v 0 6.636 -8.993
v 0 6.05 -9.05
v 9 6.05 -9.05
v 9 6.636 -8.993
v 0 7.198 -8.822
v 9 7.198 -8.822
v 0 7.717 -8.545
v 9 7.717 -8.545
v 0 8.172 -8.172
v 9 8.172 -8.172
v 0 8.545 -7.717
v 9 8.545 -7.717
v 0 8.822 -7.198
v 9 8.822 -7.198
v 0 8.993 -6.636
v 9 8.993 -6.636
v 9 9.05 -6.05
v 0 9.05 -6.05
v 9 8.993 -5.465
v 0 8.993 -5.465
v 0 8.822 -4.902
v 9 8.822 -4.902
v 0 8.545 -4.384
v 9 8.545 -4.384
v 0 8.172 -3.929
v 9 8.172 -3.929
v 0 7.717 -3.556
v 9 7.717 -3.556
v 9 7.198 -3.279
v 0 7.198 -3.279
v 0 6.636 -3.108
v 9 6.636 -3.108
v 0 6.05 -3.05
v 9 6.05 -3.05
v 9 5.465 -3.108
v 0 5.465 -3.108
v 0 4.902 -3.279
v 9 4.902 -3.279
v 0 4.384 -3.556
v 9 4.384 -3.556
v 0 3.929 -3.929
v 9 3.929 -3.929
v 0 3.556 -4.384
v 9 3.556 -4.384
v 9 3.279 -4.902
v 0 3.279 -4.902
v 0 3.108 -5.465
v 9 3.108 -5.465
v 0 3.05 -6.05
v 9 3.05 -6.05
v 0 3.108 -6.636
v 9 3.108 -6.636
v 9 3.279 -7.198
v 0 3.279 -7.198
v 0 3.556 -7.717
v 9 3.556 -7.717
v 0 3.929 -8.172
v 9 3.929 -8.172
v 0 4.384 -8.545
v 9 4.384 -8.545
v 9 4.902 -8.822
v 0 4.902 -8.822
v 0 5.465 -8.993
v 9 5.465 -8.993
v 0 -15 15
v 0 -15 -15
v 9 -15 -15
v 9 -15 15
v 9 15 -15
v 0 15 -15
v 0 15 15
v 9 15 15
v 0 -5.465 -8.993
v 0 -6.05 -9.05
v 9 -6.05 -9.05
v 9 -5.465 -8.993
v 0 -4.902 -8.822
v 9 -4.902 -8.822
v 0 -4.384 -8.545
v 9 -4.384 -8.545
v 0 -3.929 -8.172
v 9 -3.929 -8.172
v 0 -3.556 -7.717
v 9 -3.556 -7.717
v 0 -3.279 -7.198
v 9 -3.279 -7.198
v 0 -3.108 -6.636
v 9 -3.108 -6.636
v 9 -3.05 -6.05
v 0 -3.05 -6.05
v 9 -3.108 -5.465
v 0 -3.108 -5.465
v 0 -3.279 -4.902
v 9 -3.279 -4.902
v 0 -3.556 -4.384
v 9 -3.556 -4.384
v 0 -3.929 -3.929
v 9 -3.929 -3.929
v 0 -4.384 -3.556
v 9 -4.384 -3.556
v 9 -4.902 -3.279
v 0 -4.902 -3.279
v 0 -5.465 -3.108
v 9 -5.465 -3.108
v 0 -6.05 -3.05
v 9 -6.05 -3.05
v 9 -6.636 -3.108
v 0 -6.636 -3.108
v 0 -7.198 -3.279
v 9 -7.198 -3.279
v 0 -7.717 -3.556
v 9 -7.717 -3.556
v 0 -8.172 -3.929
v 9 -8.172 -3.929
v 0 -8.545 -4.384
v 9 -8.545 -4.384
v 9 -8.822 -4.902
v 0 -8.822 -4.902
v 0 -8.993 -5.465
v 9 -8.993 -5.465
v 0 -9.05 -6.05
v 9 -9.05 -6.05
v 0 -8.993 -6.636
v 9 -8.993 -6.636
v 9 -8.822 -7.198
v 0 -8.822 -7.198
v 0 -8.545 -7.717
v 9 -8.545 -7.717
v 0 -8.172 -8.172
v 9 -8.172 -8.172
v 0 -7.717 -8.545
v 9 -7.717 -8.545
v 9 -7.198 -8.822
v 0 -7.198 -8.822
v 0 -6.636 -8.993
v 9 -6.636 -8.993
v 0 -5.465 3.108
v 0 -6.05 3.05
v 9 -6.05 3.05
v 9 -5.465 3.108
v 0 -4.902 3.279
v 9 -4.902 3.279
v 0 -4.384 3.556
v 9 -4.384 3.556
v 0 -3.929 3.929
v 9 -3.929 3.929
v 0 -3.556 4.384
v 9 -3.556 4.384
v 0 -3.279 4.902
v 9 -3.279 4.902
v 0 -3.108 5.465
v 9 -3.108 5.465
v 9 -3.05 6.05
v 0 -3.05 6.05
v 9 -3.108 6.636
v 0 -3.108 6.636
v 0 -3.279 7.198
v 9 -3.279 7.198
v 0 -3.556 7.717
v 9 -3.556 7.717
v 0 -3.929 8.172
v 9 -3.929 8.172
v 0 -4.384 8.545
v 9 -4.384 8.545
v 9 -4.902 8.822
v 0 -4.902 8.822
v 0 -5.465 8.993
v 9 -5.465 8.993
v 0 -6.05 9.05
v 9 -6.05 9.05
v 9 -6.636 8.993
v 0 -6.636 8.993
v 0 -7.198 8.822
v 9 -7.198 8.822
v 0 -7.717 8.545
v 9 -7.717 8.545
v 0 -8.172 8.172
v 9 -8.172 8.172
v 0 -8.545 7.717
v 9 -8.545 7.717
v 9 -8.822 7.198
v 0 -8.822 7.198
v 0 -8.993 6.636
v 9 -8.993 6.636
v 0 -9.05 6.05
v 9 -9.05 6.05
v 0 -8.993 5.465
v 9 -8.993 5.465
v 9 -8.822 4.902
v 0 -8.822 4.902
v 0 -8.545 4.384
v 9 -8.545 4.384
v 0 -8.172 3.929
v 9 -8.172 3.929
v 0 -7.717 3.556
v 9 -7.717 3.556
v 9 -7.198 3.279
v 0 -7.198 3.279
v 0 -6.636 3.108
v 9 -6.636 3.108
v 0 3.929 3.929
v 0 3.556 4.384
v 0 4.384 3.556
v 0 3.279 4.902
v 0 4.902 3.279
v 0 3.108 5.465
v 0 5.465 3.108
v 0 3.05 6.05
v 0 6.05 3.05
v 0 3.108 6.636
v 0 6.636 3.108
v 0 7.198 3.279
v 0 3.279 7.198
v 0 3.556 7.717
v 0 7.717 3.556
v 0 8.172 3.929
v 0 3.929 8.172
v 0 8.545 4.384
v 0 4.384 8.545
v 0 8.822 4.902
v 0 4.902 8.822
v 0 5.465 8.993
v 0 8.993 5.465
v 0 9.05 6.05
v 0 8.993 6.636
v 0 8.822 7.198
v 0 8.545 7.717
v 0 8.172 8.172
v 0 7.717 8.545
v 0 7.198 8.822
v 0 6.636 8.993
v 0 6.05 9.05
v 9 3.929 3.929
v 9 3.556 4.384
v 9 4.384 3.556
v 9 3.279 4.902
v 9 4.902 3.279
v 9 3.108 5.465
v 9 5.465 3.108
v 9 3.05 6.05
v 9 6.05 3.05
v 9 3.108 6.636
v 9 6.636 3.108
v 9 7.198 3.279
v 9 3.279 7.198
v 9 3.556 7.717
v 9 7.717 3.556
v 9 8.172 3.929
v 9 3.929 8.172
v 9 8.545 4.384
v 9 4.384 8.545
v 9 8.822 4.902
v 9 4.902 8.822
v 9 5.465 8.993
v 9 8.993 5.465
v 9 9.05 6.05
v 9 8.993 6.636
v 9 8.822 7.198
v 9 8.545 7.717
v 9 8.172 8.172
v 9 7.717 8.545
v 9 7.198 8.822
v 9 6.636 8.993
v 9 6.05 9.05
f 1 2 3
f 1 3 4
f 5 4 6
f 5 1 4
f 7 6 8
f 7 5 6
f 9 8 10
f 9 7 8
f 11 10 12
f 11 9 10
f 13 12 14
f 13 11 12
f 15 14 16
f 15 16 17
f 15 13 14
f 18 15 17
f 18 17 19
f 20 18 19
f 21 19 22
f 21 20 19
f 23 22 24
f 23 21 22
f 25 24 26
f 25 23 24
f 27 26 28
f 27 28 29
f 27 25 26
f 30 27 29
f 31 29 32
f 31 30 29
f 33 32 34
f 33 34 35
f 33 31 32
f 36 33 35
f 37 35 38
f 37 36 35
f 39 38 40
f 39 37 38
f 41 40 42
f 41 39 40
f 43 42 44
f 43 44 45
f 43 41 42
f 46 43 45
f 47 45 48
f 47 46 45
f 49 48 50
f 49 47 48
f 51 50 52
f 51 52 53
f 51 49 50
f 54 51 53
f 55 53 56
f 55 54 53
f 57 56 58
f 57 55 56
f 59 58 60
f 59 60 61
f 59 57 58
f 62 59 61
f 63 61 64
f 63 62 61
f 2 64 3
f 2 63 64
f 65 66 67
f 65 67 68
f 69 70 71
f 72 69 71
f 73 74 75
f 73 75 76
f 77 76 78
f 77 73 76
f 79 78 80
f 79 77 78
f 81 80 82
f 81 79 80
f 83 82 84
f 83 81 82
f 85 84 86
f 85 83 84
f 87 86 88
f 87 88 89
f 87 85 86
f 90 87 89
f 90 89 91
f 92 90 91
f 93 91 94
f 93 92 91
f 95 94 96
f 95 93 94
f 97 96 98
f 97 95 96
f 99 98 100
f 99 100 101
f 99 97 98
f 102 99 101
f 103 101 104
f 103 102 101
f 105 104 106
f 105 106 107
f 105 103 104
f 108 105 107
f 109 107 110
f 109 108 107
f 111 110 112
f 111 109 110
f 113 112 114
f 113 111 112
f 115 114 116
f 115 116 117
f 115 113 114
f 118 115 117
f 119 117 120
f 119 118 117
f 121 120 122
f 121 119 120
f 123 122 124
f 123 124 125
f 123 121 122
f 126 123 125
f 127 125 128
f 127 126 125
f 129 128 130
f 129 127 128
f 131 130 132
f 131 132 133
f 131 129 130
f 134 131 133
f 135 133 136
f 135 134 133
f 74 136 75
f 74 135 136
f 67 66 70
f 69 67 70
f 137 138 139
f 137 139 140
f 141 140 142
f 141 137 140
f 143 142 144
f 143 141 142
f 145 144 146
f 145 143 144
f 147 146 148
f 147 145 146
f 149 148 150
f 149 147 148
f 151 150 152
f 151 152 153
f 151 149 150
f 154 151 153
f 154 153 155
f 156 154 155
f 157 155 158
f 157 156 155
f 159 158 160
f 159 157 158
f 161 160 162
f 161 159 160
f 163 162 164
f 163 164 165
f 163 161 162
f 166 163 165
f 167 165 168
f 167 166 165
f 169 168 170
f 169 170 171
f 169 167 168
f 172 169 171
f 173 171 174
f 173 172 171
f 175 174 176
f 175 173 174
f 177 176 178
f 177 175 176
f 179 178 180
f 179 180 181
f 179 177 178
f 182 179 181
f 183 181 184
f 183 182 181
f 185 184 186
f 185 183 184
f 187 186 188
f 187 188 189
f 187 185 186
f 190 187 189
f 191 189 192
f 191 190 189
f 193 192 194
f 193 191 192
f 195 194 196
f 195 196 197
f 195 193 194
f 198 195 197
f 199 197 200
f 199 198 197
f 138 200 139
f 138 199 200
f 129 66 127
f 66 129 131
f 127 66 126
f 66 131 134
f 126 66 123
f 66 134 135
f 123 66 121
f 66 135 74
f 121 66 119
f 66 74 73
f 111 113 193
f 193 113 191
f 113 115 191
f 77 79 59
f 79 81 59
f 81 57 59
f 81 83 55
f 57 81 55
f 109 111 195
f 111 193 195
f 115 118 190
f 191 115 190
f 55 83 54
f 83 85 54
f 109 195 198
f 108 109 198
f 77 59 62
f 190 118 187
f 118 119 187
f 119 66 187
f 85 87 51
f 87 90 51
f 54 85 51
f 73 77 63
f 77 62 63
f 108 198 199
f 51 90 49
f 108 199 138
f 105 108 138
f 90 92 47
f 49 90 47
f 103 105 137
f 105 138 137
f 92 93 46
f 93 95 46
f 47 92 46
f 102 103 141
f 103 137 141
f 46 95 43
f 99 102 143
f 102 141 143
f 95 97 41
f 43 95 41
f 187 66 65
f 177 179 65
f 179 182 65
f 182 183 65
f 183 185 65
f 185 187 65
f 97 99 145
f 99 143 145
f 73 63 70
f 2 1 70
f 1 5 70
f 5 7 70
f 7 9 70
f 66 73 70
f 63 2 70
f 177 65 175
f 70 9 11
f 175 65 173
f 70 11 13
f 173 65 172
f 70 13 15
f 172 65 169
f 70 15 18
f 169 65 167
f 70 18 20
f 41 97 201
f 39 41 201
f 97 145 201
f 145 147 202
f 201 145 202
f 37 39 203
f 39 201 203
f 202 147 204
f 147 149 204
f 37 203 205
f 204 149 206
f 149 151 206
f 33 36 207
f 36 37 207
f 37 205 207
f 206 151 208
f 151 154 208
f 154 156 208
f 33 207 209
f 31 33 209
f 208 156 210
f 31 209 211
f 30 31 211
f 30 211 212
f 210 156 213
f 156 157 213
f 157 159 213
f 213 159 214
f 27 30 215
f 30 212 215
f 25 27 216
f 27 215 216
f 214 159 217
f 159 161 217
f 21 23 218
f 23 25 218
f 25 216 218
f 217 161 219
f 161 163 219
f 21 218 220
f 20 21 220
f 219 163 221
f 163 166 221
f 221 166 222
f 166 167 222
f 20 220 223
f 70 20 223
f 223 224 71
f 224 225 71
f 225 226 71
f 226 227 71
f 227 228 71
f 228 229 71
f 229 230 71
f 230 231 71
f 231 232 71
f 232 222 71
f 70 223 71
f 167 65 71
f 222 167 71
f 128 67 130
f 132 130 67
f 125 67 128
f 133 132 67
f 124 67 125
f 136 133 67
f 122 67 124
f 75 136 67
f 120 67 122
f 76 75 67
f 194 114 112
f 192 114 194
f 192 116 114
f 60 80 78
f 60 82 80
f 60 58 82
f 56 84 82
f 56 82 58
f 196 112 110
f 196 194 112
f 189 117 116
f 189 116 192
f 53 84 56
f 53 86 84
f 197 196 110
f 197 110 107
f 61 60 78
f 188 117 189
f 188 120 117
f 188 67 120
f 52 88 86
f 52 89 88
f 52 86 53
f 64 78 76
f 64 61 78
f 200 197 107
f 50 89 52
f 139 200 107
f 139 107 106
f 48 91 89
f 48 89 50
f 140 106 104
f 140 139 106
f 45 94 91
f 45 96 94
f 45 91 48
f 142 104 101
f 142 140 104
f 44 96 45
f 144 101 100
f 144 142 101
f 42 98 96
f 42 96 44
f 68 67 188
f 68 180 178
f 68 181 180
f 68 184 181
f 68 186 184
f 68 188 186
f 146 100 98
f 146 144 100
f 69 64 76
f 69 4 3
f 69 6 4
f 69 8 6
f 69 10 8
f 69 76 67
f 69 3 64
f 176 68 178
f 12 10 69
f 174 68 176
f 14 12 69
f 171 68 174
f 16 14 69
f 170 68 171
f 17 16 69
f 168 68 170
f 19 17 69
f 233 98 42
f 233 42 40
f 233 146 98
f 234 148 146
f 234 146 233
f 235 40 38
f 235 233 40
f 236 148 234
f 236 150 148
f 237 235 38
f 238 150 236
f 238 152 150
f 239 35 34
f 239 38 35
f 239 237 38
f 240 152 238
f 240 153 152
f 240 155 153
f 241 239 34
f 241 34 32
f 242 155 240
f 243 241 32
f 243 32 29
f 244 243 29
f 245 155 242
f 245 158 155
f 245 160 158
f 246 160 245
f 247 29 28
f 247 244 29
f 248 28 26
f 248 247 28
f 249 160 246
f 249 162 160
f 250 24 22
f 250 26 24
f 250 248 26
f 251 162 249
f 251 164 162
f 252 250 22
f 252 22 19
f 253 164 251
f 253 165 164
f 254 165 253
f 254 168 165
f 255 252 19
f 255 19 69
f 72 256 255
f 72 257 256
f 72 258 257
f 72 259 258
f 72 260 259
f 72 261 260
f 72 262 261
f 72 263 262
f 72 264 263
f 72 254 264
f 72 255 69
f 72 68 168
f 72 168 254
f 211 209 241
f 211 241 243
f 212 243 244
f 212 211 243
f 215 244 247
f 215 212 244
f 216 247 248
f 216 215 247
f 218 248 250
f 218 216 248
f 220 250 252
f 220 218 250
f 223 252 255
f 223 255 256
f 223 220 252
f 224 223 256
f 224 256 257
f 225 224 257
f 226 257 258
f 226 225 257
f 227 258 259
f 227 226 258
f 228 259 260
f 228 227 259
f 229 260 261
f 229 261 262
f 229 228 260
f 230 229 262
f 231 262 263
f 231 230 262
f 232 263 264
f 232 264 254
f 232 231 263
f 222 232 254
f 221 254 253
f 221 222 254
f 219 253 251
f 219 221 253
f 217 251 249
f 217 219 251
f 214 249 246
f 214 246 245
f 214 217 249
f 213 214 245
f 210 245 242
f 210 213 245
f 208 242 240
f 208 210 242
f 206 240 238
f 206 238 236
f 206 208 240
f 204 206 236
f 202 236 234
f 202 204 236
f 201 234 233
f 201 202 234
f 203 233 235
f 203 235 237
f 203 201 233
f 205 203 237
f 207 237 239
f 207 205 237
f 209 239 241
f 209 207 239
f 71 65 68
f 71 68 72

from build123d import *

# Parameters (mm, degrees)
SKETCH1_W           = 30
SKETCH1_H           = 30
SKETCH1_R           = 3
BOSS_EXTRUDE1_DEPTH = 9


with BuildPart() as part:
    # Sketch1 → Boss-Extrude1 (new body)
    with BuildSketch(Plane.YZ):
        Rectangle(SKETCH1_W, SKETCH1_H)
        with Locations(Location((6.050252532, 6.050252532, 0), (0, 0, 270))):
            Circle(SKETCH1_R, mode=Mode.SUBTRACT)
        with Locations(Location((-6.050252532, 6.050252532, 0), (0, 0, 270))):
            Circle(SKETCH1_R, mode=Mode.SUBTRACT)
        with Locations(Location((-6.050252532, -6.050252532, 0), (0, 0, 270))):
            Circle(SKETCH1_R, mode=Mode.SUBTRACT)
        with Locations(Location((6.050252532, -6.050252532, 0), (0, 0, 270))):
            Circle(SKETCH1_R, mode=Mode.SUBTRACT)
    extrude(amount=BOSS_EXTRUDE1_DEPTH)


solid = part.part
